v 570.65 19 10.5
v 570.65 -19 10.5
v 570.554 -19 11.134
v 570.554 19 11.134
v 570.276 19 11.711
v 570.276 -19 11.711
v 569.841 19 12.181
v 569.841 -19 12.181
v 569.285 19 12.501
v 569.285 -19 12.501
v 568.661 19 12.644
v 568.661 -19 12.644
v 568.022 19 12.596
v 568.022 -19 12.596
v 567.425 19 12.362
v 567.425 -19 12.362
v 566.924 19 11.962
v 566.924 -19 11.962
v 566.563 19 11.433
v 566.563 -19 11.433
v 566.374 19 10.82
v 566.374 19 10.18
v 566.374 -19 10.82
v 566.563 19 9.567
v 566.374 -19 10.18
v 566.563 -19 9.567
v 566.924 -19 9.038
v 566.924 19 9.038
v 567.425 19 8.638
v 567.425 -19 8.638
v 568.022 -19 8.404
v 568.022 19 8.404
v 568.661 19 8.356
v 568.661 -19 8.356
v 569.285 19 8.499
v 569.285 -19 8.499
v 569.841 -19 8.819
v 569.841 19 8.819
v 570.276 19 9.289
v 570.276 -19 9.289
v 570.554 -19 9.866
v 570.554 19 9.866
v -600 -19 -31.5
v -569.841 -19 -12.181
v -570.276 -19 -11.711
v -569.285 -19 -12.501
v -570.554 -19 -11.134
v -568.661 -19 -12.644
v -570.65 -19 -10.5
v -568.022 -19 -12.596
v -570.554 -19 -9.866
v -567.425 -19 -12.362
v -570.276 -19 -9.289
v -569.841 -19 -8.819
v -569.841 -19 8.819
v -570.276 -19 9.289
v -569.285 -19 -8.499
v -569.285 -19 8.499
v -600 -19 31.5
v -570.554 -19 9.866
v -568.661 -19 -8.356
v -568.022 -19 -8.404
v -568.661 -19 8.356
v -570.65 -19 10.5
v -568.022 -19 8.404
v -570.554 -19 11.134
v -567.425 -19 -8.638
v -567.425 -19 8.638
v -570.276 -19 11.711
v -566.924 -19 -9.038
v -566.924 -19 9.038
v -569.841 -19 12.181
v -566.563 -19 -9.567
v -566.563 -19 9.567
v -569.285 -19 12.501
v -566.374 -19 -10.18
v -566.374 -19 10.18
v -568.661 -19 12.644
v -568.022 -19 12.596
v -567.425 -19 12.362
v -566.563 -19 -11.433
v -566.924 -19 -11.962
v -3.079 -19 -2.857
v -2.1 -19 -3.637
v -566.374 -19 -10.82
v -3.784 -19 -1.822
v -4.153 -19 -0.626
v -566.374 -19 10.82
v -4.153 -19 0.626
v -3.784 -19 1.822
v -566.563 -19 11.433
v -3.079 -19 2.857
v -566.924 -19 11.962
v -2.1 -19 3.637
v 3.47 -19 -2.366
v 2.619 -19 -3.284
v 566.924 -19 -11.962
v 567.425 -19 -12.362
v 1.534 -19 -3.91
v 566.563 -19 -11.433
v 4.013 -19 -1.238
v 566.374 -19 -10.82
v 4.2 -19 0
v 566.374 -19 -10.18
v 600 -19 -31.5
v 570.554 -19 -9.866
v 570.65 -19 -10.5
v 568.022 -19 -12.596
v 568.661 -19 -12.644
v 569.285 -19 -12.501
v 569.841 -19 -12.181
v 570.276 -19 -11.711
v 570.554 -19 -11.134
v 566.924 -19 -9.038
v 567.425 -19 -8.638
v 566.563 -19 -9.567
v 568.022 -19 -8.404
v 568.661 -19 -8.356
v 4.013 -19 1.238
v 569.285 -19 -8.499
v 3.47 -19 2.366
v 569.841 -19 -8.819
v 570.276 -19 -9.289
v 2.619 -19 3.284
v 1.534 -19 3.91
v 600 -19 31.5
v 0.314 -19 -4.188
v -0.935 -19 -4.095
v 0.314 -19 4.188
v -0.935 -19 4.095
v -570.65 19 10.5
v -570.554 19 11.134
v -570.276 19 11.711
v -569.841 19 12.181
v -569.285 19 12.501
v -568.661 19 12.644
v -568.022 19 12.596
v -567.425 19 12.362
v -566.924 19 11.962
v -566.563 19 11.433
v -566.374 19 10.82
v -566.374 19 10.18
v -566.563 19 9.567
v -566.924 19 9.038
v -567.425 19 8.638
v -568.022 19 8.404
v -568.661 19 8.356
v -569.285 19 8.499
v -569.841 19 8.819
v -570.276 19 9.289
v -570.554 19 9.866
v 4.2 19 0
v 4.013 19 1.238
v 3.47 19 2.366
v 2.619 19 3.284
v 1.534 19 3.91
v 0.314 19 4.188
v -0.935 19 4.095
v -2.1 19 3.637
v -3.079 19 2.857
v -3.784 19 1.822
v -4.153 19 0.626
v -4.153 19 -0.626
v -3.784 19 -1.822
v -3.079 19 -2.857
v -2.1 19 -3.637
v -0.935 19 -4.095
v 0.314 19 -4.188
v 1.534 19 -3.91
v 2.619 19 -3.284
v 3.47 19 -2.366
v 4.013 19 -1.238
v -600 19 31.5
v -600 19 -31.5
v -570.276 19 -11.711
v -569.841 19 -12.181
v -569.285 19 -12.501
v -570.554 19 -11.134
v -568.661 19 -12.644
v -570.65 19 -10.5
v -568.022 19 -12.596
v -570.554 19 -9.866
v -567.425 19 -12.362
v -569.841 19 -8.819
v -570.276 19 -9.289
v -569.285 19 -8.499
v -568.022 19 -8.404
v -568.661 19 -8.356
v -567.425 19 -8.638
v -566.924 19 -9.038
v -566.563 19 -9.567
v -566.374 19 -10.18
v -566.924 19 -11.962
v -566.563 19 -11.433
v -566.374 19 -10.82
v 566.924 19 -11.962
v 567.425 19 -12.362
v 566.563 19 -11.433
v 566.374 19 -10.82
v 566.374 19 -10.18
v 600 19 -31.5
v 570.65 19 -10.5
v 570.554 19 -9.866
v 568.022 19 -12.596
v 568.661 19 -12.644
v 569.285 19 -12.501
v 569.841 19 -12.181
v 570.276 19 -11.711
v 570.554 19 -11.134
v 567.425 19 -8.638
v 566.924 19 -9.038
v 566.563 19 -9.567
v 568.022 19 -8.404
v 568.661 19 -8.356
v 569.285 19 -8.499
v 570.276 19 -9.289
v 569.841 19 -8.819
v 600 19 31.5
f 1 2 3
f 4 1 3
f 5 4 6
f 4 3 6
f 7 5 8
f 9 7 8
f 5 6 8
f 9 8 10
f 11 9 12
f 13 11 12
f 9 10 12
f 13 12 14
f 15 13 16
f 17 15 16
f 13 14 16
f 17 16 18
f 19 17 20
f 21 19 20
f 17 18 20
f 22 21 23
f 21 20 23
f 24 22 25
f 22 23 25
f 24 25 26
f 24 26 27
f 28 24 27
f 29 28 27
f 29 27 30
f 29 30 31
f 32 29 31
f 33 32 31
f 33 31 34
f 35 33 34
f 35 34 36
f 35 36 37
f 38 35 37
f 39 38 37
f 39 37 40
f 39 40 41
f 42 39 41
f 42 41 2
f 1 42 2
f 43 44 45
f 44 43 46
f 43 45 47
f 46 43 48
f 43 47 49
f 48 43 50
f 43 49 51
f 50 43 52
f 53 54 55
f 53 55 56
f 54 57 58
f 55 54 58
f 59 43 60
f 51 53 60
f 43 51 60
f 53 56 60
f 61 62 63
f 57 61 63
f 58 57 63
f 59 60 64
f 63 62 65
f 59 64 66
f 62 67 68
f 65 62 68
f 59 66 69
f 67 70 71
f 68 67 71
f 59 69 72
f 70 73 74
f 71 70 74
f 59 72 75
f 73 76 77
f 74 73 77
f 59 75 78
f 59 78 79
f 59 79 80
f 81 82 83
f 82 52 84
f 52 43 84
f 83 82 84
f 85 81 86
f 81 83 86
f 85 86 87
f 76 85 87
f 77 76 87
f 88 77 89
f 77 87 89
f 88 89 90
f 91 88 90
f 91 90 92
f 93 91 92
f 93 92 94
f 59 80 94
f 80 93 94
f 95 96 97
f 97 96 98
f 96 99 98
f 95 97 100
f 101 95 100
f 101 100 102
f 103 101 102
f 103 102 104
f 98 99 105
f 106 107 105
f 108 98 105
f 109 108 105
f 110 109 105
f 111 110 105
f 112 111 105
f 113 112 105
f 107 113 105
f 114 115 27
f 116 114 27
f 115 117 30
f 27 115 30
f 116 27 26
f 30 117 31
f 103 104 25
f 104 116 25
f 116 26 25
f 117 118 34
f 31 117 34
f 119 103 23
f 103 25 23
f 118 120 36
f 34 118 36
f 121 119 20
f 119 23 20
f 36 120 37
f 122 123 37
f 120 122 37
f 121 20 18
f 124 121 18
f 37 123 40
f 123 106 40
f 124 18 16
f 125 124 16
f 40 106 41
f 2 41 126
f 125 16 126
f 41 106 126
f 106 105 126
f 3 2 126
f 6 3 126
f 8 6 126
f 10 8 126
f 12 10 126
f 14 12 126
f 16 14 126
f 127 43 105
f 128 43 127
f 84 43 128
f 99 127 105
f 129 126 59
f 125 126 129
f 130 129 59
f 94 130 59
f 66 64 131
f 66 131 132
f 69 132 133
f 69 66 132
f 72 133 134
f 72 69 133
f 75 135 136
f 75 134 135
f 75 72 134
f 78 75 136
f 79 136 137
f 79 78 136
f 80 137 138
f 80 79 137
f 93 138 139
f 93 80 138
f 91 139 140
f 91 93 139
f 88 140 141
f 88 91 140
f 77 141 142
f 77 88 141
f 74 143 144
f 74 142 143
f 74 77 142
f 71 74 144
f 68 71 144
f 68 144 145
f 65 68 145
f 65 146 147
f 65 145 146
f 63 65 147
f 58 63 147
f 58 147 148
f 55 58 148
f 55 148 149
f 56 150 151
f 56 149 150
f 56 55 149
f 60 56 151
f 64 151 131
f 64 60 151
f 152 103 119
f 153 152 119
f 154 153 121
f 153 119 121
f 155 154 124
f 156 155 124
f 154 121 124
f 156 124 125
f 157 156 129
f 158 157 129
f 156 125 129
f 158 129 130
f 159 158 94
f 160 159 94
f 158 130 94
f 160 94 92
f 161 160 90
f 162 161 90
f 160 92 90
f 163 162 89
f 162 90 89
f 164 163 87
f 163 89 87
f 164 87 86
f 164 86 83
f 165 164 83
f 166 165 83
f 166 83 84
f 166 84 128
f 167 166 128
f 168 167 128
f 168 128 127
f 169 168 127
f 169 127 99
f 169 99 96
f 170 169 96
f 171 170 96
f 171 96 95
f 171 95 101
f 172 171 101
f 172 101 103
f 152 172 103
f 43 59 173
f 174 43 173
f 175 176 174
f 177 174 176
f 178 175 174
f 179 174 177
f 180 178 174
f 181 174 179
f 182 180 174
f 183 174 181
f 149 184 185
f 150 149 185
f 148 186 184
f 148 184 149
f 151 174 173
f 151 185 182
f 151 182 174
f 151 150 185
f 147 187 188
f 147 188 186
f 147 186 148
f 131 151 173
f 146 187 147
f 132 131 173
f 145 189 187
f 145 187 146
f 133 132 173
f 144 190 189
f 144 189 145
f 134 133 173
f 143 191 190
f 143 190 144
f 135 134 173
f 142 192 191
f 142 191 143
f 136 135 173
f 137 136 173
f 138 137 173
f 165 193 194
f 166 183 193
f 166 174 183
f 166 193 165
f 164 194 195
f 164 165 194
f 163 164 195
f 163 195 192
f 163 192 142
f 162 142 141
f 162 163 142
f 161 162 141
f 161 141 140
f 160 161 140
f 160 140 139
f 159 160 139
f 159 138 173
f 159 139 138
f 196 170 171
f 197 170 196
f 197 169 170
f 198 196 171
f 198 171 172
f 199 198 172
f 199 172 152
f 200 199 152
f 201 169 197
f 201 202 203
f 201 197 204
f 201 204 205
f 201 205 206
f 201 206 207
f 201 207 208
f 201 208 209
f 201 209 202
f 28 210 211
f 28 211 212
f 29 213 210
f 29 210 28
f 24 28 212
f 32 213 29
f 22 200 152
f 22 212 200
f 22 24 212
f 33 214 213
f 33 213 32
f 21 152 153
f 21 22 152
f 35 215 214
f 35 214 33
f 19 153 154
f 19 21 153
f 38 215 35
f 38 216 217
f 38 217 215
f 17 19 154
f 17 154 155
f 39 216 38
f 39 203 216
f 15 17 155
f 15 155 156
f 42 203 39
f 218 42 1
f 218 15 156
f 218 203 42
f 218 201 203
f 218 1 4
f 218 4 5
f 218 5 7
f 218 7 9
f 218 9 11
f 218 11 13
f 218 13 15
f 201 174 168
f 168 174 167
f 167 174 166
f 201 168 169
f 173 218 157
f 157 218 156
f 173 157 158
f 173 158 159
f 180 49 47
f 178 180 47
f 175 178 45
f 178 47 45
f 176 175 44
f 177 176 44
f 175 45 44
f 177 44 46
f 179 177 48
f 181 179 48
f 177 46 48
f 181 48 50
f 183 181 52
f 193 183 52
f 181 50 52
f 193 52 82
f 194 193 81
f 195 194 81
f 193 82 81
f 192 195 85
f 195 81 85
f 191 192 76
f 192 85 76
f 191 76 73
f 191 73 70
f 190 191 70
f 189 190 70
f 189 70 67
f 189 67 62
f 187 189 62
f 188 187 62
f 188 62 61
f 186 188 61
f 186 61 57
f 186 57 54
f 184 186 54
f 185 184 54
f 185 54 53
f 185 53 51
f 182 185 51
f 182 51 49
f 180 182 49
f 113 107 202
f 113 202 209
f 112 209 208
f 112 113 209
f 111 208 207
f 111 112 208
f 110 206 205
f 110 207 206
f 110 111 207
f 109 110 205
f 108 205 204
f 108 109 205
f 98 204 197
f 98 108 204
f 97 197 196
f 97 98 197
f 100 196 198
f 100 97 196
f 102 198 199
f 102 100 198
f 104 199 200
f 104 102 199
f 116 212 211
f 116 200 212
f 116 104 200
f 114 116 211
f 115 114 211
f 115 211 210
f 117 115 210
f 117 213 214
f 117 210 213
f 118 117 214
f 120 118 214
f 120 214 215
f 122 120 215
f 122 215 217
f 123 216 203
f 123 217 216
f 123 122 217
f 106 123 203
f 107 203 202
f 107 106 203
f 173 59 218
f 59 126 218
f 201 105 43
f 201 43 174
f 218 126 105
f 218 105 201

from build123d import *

# Parameters (mm, degrees)
SKETCH_W                 = 38
SKETCH_H                 = 63
PAD_DEPTH                = 600
SKETCH001_R              = 4.2
HOLE_DEPTH               = 50.501
SKETCH002_R              = 2.15
HOLE001_DEPTH            = 2455.007602
SKETCH002_MIRRORED_2_R   = 2.15
HOLE001_MIRRORED_2_DEPTH = 2455.007602


with BuildPart() as part:
    # Sketch → Pad (new body, symmetric)
    with BuildSketch(Plane.YZ):
        Rectangle(SKETCH_W, SKETCH_H)
    extrude(amount=PAD_DEPTH, both=True)

    # Sketch001 → Hole (cut, through all)
    with BuildSketch(Plane.XZ.offset(31.5)):
        Circle(SKETCH001_R)
    extrude(amount=-HOLE_DEPTH, mode=Mode.SUBTRACT)

    # Sketch002 → Hole001 (cut, through all)
    with BuildSketch(Plane.XZ.offset(31.5)):
        with Locations((568.5, 10.5)):
            Circle(SKETCH002_R)
    hole001 = extrude(amount=-HOLE001_DEPTH, mode=Mode.SUBTRACT)

    # Sketch002 Mirrored 2 → Hole001 Mirrored 2 (cut, through all)
    with BuildSketch(Plane(origin=(0, -31.5, 0), x_dir=(-1, 0, 0), z_dir=(0, 1, 0))):
        with Locations((568.5, 10.5)):
            Circle(SKETCH002_MIRRORED_2_R)
    hole001_mirrored_2 = extrude(amount=HOLE001_MIRRORED_2_DEPTH, mode=Mode.SUBTRACT)

    # Mirrored001: Hole001, Hole001 Mirrored 2 across Sketch002 H_Axis
    add(hole001.mirror(Plane(origin=(0, -31.5, 0), x_dir=(0, -1, 0), z_dir=(0, 0, 1))), mode=Mode.SUBTRACT)
    add(hole001_mirrored_2.mirror(Plane(origin=(0, -31.5, 0), x_dir=(0, -1, 0), z_dir=(0, 0, 1))), mode=Mode.SUBTRACT)


solid = part.part
